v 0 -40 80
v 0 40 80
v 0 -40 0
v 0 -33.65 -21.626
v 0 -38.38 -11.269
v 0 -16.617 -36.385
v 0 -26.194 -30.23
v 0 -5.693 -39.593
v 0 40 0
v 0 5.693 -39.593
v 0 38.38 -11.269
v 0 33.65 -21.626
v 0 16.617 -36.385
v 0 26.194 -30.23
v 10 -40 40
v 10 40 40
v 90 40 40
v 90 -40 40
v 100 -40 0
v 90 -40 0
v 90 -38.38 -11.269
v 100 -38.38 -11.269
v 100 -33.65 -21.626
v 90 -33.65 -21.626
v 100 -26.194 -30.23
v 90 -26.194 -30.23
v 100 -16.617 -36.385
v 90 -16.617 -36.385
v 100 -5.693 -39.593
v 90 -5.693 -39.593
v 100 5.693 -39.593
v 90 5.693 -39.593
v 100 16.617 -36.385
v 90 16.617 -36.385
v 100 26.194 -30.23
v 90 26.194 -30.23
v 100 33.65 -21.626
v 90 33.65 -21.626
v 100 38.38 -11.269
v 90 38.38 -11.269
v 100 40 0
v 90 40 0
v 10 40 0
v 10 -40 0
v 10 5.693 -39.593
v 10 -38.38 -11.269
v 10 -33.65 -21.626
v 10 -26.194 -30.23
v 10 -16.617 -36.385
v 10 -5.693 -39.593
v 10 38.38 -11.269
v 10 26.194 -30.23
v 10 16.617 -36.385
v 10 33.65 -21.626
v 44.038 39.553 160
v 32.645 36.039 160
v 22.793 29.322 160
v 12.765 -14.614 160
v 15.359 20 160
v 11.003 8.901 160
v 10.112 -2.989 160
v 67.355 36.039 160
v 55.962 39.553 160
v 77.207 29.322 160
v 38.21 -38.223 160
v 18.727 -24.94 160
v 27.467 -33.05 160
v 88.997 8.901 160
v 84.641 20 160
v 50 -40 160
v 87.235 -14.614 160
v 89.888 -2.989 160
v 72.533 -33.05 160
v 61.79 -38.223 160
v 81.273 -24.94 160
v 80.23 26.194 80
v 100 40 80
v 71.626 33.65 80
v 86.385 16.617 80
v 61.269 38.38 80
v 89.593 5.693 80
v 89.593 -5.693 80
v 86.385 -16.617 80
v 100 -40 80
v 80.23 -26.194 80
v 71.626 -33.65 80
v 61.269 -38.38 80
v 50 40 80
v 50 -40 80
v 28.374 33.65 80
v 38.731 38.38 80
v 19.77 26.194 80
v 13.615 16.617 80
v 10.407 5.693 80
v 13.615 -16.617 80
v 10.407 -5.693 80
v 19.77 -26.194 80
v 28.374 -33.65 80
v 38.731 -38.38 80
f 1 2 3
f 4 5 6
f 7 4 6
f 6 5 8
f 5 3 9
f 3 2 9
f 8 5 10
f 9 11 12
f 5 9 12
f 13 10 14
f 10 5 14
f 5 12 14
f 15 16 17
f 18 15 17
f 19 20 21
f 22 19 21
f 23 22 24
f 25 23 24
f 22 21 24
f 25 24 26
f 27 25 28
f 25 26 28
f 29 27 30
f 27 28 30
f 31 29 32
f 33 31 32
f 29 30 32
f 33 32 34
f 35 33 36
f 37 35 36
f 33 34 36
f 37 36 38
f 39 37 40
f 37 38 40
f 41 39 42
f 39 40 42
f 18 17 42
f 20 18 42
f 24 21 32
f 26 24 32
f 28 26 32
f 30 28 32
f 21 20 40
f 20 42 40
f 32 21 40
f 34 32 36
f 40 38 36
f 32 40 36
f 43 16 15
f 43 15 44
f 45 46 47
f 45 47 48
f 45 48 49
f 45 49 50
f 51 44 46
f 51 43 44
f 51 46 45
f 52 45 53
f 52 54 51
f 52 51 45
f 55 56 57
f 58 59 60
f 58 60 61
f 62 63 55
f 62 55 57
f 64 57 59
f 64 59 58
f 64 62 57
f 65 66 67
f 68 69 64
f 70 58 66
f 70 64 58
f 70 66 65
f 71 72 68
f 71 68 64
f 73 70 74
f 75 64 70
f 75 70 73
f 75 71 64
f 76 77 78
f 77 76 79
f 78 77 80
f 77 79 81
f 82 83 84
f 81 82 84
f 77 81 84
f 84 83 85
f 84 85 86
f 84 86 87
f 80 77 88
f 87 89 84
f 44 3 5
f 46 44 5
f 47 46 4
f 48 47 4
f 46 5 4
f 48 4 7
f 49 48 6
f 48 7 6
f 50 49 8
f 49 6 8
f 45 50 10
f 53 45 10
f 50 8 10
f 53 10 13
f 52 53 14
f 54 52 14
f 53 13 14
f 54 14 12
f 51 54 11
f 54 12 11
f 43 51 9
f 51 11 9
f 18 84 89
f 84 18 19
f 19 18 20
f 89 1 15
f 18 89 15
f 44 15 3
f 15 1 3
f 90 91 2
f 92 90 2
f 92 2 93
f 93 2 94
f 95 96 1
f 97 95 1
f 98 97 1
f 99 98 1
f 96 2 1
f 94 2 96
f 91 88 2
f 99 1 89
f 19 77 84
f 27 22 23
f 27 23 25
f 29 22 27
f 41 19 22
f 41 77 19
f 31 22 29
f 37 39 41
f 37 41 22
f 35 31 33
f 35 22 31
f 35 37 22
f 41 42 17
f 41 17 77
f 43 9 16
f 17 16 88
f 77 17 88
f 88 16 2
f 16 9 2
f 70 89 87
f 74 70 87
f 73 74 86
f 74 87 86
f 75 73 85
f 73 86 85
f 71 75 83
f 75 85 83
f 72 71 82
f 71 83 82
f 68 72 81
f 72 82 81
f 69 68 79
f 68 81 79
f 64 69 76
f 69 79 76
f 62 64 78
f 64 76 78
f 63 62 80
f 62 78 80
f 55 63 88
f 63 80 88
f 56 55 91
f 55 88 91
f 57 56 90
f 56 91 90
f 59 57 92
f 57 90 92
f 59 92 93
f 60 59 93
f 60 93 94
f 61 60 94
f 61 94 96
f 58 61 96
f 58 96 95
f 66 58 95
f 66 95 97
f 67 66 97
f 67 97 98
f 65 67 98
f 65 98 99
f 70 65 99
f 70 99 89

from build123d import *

# Parameters (mm, degrees)
BOSS_EXTRUDE1_DEPTH = 100
SKETCH2_W           = 80
SKETCH2_H           = 80
CUT_EXTRUDE1_DEPTH  = 100
SKETCH3_R           = 40
BOSS_EXTRUDE2_DEPTH = 80


with BuildPart() as part:
    # Sketch1 → Boss-Extrude1 (new body)
    with BuildSketch(Plane(origin=(0, 0, 0), x_dir=(0, 0, -1), z_dir=(1, 0, 0))):
        with BuildLine():
            Line((0, 40), (-80, 40))
            Line((-80, 40), (-80, -40))
            Line((-80, -40), (0, -40))
            ThreePointArc((0, -40), (40, 0), (0, 40))
        make_face()
    extrude(amount=BOSS_EXTRUDE1_DEPTH)

    # Sketch2 → Cut-Extrude1 (cut)
    with BuildSketch(Plane(origin=(0, 40, 0), x_dir=(1, 0, 0), z_dir=(0, 1, 0))):
        with Locations((50, 0)):
            Rectangle(SKETCH2_W, SKETCH2_H)
    extrude(amount=-CUT_EXTRUDE1_DEPTH, mode=Mode.SUBTRACT)

    # Sketch3 → Boss-Extrude2 (add)
    with BuildSketch(Plane.XY.offset(80)):
        with Locations(Location((50, 0, 0), (0, 0, 270))):
            Circle(SKETCH3_R)
    extrude(amount=BOSS_EXTRUDE2_DEPTH)


solid = part.part
